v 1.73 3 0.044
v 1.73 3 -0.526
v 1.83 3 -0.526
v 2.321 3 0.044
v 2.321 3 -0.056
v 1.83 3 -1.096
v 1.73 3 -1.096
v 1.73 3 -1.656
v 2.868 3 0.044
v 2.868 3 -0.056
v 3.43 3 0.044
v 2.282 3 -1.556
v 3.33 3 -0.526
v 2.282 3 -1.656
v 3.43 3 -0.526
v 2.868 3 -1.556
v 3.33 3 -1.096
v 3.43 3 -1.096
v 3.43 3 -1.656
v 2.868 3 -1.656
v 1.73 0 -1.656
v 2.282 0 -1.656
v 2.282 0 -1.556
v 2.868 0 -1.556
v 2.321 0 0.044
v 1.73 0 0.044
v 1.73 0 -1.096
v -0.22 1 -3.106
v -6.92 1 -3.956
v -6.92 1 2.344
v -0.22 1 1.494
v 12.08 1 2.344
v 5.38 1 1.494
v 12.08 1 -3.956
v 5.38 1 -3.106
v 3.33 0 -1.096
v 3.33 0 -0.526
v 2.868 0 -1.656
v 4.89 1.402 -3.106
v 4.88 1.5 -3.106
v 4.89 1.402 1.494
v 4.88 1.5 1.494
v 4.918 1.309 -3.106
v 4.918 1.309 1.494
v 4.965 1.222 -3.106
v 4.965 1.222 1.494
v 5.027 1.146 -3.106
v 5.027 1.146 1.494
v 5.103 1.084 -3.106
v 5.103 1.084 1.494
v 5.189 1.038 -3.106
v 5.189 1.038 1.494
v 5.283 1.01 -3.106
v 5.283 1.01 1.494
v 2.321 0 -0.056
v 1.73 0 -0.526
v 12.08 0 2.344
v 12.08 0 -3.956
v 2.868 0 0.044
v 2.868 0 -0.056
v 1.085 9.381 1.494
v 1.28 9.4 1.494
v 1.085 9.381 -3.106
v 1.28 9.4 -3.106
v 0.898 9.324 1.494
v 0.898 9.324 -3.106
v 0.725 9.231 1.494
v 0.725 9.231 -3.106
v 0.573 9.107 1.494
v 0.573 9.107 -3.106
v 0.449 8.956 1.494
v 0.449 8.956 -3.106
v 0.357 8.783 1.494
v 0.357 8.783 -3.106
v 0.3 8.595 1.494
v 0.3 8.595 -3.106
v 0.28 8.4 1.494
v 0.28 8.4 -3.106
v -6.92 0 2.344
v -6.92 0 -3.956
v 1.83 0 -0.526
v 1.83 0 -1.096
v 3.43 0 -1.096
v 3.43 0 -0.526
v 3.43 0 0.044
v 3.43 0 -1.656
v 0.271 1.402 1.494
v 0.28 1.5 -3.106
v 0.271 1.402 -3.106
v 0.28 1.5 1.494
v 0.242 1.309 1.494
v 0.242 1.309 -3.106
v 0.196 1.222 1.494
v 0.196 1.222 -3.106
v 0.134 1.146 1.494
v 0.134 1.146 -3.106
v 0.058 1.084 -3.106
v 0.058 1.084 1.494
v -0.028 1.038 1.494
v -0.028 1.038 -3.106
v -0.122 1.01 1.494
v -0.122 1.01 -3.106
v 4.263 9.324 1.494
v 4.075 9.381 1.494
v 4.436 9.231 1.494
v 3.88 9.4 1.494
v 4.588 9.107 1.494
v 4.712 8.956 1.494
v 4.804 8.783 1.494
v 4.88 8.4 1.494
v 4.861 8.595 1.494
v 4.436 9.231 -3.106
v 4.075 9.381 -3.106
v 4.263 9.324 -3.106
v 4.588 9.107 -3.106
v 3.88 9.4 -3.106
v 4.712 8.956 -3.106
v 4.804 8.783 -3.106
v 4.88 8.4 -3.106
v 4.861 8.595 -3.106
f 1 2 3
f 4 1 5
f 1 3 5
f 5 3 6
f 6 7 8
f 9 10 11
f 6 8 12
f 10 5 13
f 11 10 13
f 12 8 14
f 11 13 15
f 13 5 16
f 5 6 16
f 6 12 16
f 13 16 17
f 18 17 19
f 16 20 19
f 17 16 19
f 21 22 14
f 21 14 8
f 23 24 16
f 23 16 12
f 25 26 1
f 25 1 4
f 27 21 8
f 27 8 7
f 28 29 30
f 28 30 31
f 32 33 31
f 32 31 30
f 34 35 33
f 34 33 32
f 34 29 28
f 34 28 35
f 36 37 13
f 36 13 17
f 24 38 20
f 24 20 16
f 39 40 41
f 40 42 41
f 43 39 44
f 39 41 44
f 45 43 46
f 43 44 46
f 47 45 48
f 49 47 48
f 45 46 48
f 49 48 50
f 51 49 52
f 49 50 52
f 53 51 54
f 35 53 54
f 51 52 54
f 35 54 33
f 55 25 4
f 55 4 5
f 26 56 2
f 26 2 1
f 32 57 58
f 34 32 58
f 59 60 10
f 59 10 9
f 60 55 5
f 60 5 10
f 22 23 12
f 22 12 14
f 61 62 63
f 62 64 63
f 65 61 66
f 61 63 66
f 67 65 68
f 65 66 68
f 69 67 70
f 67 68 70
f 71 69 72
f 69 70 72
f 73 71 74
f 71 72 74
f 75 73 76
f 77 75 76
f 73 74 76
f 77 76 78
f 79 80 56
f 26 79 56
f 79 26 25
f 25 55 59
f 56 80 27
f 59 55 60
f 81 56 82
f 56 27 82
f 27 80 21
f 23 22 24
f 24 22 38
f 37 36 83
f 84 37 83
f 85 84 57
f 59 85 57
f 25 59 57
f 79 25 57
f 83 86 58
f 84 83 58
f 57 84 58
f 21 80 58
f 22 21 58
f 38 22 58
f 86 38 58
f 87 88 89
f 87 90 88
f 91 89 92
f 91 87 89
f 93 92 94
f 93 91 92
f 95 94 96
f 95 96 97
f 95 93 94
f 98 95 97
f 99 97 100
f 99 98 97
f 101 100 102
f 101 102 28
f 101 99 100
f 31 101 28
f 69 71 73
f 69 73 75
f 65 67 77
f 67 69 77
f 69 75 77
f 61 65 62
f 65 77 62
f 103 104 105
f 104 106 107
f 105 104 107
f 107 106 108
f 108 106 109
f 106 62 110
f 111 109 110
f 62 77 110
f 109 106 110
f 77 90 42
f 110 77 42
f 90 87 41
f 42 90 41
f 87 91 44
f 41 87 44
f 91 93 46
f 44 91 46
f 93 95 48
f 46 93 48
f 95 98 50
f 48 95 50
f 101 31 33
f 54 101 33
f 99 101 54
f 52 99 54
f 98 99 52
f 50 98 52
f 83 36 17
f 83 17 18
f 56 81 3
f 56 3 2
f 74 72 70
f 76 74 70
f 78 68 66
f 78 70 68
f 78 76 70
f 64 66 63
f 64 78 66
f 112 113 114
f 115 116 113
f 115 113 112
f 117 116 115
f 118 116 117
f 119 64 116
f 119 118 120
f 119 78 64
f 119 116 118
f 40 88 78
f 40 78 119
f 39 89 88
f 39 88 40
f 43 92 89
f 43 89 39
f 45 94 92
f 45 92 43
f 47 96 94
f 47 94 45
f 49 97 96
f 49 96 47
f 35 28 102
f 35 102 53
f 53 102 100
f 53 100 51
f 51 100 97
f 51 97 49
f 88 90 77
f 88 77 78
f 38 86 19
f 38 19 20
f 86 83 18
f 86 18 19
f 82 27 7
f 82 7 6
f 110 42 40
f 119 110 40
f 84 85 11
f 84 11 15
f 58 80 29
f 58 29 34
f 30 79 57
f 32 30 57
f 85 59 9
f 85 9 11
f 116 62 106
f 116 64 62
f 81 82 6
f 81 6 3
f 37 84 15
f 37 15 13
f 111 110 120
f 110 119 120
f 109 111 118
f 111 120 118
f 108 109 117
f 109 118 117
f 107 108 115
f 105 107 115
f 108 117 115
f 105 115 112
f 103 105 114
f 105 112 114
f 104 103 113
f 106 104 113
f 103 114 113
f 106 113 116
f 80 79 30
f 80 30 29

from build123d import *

# Parameters (mm, degrees)
SKETCH1_W           = 19
SKETCH1_H           = 6.3
BOSS_EXTRUDE1_DEPTH = 1
SKETCH1_3_W         = 4.6
SKETCH1_3_H         = 4.6
BOSS_EXTRUDE2_DEPTH = 9.4
FILLET6_R           = 1
FILLET7_R           = 1
FILLET9_R           = 0.5
FILLET10_R          = 0.5
CUT_EXTRUDE6_DEPTH  = 3


with BuildPart() as part:
    # Sketch1 → Boss-Extrude1 (new body)
    with BuildSketch(Plane(origin=(0, 0, 0), x_dir=(1, 0, 0), z_dir=(0, 1, 0))):
        with Locations((2.580402043, 0.806197617)):
            Rectangle(SKETCH1_W, SKETCH1_H)
    extrude(amount=BOSS_EXTRUDE1_DEPTH)

    # Sketch1<3> → Boss-Extrude2 (add)
    with BuildSketch(Plane(origin=(0, 0, 0), x_dir=(1, 0, 0), z_dir=(0, 1, 0))):
        with Locations((2.580402043, 0.806197617)):
            Rectangle(SKETCH1_3_W, SKETCH1_3_H)
    extrude(amount=BOSS_EXTRUDE2_DEPTH)

    # Fillet6
    fillet6_edges = [part.edges().sort_by_distance(p)[0] for p in [
        (4.880402043, 9.4, -0.806197617),
    ]]
    fillet(fillet6_edges, radius=FILLET6_R)

    # Fillet7
    fillet7_edges = [part.edges().sort_by_distance(p)[0] for p in [
        (0.280402043, 9.4, -0.806197617),
    ]]
    fillet(fillet7_edges, radius=FILLET7_R)

    # Fillet9
    fillet9_edges = [part.edges().sort_by_distance(p)[0] for p in [
        (4.880402043, 1, -0.806197617),
    ]]
    fillet(fillet9_edges, radius=FILLET9_R)

    # Fillet10
    fillet10_edges = [part.edges().sort_by_distance(p)[0] for p in [
        (0.280402043, 1, -0.806197617),
    ]]
    fillet(fillet10_edges, radius=FILLET10_R)

    # Sketch1<6> → Cut-Extrude6 (cut)
    with BuildSketch(Plane(origin=(0, 0, 0), x_dir=(1, 0, 0), z_dir=(0, 1, 0))):
        Polygon((1.730402043, 1.656197617), (1.730402043, 1.096346732), (1.830402043, 1.096346732), (1.830402043, 0.525612743), (1.730402043, 0.525612743), (1.730402043, -0.043802383), (2.321489292, -0.043802383), (2.321489292, 0.056197617), (2.868074208, 0.056197617), (2.868074208, -0.043802383), (3.430402043, -0.043802383), (3.430402043, 0.525612743), (3.330402043, 0.525612743), (3.330402043, 1.096346732), (3.430402043, 1.096346732), (3.430402043, 1.656197617), (2.868074208, 1.656197617), (2.868074208, 1.556197617), (2.282451593, 1.556197617), (2.282451593, 1.656197617), align=None)
    extrude(amount=CUT_EXTRUDE6_DEPTH, mode=Mode.SUBTRACT)


solid = part.part
